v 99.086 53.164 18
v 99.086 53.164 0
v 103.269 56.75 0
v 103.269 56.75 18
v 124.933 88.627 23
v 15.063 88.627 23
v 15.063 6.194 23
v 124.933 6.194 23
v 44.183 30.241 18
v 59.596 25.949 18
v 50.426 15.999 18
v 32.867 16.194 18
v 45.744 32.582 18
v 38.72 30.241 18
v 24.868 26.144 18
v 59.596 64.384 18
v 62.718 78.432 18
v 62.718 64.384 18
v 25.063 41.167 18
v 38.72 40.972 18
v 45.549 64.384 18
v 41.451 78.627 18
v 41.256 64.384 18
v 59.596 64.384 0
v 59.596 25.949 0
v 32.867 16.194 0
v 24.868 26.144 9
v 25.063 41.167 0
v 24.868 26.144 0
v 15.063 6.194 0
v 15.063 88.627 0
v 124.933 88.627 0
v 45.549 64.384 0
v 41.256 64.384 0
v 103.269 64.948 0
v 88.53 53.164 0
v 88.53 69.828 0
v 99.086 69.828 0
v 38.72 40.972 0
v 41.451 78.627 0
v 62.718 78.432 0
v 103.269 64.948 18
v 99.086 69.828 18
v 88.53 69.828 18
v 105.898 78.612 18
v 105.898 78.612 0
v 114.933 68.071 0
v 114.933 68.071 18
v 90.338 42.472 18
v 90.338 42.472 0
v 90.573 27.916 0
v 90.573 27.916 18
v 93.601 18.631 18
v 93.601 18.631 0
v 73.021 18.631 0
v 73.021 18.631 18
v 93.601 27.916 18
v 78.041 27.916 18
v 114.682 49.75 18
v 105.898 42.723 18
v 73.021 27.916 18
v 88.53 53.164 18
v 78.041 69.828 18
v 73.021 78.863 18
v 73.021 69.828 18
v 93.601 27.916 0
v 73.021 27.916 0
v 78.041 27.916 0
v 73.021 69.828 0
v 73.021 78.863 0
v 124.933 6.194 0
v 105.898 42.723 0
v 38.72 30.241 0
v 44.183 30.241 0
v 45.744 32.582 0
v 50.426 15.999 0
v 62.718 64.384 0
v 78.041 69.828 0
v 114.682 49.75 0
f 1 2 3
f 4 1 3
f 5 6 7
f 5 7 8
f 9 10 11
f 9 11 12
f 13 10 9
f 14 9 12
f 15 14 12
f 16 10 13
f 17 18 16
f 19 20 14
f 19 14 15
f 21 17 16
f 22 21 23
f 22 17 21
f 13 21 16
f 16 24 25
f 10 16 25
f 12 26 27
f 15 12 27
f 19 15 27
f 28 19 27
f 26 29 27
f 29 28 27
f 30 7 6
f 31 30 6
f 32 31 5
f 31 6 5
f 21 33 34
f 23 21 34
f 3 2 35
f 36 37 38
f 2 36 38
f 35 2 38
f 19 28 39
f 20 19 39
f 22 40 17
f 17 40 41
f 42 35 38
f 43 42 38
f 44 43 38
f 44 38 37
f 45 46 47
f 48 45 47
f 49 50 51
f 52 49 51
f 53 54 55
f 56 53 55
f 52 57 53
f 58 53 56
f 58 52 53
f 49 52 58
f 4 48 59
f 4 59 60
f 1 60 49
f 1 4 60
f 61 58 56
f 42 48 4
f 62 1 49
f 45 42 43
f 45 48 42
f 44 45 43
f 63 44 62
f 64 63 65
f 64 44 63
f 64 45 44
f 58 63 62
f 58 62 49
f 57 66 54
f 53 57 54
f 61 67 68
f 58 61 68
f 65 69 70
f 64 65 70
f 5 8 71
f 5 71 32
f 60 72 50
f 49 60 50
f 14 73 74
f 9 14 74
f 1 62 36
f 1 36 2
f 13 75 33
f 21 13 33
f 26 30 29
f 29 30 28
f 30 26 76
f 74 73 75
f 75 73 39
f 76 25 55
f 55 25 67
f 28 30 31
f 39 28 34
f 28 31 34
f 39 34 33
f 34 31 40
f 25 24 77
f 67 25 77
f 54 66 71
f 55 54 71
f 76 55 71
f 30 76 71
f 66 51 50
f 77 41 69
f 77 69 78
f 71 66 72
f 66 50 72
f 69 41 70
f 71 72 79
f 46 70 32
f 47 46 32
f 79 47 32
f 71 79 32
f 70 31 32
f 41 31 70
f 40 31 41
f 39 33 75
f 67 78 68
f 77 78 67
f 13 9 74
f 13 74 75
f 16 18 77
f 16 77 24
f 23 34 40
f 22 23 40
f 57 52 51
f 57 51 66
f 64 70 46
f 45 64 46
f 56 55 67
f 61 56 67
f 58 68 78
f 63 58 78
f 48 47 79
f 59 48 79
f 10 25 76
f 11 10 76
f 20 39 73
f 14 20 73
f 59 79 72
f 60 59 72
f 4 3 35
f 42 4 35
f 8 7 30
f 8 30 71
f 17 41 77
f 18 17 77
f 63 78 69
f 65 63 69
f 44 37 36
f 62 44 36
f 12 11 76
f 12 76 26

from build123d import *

# Parameters (mm, degrees)
BOSS_EXTRUDE1_DEPTH      = 18
BOSS_EXTRUDE1_2_DEPTH    = 18
SKETCH4_W                = 109.870132399
SKETCH4_H                = 82.433439447
BOSS_EXTRUDE2_DEPTH      = 5
BOSS_EXTRUDE2_DEPTH_BACK = 18


with BuildPart() as part:
    # Sketch2 → Boss-Extrude1 (new body)
    with BuildSketch(Plane.XY):
        with BuildLine():
            Line((41.451402768, 78.627112804), (62.71779308, 78.432008305))
            Line((62.71779308, 78.432008305), (62.71779308, 64.38448443))
            Line((62.71779308, 64.38448443), (59.596121107, 64.38448443))
            Line((59.596121107, 64.38448443), (59.596121107, 25.94889827))
            Line((59.596121107, 25.94889827), (50.426209689, 15.998568858))
            Line((50.426209689, 15.998568858), (32.866804844, 16.193673357))
            add(Edge.make_bspline(
                [(32.866804844, 16.193673357), (31.910610057, 17.627965538), (24.872485991, 25.751722249), (24.867520415, 26.144002768), (24.804131767, 31.151705999), (24.997590081, 36.159367013), (25.062624913, 41.167049135)],
                knots=[0, 0, 0, 0, 1, 1, 1, 2, 2, 2, 2], degree=3))
            Line((25.062624913, 41.167049135), (38.719939792, 40.971944637))
            Line((38.719939792, 40.971944637), (38.719939792, 30.241197232))
            Line((38.719939792, 30.241197232), (44.182865744, 30.241197232))
            Line((44.182865744, 30.241197232), (45.74370173, 32.582451211))
            Line((45.74370173, 32.582451211), (45.548597232, 64.38448443))
            Line((45.548597232, 64.38448443), (41.25629827, 64.38448443))
            Line((41.25629827, 64.38448443), (41.451402768, 78.627112804))
        make_face()
    extrude(amount=BOSS_EXTRUDE1_DEPTH)


with BuildPart() as body_2:
    # Sketch2 → Boss-Extrude1 2 (new body)
    with BuildSketch(Plane.XY):
        Polygon((73.021358937, 78.862525948), (105.897964848, 78.61155949), (114.932757312, 68.070968282), (114.681790855, 49.750416896), (105.897964848, 42.723356091), (90.338044493, 42.472389633), (90.572819566, 27.916335108), (93.600608438, 27.916335108), (93.600608438, 18.630576186), (73.021358937, 18.630576186), (73.021358937, 27.916335108), (78.040688083, 27.916335108), (78.040688083, 69.827733483), (73.021358937, 69.827733483), align=None)
        Polygon((88.530273253, 69.827733483), (88.530273253, 53.164474994), (99.086194651, 53.164474994), (103.268762855, 56.749533454), (103.268762855, 64.948070578), (99.086194651, 69.827733483), align=None, mode=Mode.SUBTRACT)
    extrude(amount=BOSS_EXTRUDE1_2_DEPTH)


with BuildPart() as body_3:
    # Sketch4 → Boss-Extrude2 (new body, two sides)
    with BuildSketch(Plane.XY.offset(18)) as boss_extrude2_sk:
        with Locations((69.997691113, 47.410393081)):
            Rectangle(SKETCH4_W, SKETCH4_H)
    extrude(amount=BOSS_EXTRUDE2_DEPTH)
    extrude(boss_extrude2_sk.sketch, amount=-BOSS_EXTRUDE2_DEPTH_BACK)

    # Combine1: cut part, body 2
    add(part.part, mode=Mode.SUBTRACT)
    add(body_2.part, mode=Mode.SUBTRACT)


solid = body_3.part
